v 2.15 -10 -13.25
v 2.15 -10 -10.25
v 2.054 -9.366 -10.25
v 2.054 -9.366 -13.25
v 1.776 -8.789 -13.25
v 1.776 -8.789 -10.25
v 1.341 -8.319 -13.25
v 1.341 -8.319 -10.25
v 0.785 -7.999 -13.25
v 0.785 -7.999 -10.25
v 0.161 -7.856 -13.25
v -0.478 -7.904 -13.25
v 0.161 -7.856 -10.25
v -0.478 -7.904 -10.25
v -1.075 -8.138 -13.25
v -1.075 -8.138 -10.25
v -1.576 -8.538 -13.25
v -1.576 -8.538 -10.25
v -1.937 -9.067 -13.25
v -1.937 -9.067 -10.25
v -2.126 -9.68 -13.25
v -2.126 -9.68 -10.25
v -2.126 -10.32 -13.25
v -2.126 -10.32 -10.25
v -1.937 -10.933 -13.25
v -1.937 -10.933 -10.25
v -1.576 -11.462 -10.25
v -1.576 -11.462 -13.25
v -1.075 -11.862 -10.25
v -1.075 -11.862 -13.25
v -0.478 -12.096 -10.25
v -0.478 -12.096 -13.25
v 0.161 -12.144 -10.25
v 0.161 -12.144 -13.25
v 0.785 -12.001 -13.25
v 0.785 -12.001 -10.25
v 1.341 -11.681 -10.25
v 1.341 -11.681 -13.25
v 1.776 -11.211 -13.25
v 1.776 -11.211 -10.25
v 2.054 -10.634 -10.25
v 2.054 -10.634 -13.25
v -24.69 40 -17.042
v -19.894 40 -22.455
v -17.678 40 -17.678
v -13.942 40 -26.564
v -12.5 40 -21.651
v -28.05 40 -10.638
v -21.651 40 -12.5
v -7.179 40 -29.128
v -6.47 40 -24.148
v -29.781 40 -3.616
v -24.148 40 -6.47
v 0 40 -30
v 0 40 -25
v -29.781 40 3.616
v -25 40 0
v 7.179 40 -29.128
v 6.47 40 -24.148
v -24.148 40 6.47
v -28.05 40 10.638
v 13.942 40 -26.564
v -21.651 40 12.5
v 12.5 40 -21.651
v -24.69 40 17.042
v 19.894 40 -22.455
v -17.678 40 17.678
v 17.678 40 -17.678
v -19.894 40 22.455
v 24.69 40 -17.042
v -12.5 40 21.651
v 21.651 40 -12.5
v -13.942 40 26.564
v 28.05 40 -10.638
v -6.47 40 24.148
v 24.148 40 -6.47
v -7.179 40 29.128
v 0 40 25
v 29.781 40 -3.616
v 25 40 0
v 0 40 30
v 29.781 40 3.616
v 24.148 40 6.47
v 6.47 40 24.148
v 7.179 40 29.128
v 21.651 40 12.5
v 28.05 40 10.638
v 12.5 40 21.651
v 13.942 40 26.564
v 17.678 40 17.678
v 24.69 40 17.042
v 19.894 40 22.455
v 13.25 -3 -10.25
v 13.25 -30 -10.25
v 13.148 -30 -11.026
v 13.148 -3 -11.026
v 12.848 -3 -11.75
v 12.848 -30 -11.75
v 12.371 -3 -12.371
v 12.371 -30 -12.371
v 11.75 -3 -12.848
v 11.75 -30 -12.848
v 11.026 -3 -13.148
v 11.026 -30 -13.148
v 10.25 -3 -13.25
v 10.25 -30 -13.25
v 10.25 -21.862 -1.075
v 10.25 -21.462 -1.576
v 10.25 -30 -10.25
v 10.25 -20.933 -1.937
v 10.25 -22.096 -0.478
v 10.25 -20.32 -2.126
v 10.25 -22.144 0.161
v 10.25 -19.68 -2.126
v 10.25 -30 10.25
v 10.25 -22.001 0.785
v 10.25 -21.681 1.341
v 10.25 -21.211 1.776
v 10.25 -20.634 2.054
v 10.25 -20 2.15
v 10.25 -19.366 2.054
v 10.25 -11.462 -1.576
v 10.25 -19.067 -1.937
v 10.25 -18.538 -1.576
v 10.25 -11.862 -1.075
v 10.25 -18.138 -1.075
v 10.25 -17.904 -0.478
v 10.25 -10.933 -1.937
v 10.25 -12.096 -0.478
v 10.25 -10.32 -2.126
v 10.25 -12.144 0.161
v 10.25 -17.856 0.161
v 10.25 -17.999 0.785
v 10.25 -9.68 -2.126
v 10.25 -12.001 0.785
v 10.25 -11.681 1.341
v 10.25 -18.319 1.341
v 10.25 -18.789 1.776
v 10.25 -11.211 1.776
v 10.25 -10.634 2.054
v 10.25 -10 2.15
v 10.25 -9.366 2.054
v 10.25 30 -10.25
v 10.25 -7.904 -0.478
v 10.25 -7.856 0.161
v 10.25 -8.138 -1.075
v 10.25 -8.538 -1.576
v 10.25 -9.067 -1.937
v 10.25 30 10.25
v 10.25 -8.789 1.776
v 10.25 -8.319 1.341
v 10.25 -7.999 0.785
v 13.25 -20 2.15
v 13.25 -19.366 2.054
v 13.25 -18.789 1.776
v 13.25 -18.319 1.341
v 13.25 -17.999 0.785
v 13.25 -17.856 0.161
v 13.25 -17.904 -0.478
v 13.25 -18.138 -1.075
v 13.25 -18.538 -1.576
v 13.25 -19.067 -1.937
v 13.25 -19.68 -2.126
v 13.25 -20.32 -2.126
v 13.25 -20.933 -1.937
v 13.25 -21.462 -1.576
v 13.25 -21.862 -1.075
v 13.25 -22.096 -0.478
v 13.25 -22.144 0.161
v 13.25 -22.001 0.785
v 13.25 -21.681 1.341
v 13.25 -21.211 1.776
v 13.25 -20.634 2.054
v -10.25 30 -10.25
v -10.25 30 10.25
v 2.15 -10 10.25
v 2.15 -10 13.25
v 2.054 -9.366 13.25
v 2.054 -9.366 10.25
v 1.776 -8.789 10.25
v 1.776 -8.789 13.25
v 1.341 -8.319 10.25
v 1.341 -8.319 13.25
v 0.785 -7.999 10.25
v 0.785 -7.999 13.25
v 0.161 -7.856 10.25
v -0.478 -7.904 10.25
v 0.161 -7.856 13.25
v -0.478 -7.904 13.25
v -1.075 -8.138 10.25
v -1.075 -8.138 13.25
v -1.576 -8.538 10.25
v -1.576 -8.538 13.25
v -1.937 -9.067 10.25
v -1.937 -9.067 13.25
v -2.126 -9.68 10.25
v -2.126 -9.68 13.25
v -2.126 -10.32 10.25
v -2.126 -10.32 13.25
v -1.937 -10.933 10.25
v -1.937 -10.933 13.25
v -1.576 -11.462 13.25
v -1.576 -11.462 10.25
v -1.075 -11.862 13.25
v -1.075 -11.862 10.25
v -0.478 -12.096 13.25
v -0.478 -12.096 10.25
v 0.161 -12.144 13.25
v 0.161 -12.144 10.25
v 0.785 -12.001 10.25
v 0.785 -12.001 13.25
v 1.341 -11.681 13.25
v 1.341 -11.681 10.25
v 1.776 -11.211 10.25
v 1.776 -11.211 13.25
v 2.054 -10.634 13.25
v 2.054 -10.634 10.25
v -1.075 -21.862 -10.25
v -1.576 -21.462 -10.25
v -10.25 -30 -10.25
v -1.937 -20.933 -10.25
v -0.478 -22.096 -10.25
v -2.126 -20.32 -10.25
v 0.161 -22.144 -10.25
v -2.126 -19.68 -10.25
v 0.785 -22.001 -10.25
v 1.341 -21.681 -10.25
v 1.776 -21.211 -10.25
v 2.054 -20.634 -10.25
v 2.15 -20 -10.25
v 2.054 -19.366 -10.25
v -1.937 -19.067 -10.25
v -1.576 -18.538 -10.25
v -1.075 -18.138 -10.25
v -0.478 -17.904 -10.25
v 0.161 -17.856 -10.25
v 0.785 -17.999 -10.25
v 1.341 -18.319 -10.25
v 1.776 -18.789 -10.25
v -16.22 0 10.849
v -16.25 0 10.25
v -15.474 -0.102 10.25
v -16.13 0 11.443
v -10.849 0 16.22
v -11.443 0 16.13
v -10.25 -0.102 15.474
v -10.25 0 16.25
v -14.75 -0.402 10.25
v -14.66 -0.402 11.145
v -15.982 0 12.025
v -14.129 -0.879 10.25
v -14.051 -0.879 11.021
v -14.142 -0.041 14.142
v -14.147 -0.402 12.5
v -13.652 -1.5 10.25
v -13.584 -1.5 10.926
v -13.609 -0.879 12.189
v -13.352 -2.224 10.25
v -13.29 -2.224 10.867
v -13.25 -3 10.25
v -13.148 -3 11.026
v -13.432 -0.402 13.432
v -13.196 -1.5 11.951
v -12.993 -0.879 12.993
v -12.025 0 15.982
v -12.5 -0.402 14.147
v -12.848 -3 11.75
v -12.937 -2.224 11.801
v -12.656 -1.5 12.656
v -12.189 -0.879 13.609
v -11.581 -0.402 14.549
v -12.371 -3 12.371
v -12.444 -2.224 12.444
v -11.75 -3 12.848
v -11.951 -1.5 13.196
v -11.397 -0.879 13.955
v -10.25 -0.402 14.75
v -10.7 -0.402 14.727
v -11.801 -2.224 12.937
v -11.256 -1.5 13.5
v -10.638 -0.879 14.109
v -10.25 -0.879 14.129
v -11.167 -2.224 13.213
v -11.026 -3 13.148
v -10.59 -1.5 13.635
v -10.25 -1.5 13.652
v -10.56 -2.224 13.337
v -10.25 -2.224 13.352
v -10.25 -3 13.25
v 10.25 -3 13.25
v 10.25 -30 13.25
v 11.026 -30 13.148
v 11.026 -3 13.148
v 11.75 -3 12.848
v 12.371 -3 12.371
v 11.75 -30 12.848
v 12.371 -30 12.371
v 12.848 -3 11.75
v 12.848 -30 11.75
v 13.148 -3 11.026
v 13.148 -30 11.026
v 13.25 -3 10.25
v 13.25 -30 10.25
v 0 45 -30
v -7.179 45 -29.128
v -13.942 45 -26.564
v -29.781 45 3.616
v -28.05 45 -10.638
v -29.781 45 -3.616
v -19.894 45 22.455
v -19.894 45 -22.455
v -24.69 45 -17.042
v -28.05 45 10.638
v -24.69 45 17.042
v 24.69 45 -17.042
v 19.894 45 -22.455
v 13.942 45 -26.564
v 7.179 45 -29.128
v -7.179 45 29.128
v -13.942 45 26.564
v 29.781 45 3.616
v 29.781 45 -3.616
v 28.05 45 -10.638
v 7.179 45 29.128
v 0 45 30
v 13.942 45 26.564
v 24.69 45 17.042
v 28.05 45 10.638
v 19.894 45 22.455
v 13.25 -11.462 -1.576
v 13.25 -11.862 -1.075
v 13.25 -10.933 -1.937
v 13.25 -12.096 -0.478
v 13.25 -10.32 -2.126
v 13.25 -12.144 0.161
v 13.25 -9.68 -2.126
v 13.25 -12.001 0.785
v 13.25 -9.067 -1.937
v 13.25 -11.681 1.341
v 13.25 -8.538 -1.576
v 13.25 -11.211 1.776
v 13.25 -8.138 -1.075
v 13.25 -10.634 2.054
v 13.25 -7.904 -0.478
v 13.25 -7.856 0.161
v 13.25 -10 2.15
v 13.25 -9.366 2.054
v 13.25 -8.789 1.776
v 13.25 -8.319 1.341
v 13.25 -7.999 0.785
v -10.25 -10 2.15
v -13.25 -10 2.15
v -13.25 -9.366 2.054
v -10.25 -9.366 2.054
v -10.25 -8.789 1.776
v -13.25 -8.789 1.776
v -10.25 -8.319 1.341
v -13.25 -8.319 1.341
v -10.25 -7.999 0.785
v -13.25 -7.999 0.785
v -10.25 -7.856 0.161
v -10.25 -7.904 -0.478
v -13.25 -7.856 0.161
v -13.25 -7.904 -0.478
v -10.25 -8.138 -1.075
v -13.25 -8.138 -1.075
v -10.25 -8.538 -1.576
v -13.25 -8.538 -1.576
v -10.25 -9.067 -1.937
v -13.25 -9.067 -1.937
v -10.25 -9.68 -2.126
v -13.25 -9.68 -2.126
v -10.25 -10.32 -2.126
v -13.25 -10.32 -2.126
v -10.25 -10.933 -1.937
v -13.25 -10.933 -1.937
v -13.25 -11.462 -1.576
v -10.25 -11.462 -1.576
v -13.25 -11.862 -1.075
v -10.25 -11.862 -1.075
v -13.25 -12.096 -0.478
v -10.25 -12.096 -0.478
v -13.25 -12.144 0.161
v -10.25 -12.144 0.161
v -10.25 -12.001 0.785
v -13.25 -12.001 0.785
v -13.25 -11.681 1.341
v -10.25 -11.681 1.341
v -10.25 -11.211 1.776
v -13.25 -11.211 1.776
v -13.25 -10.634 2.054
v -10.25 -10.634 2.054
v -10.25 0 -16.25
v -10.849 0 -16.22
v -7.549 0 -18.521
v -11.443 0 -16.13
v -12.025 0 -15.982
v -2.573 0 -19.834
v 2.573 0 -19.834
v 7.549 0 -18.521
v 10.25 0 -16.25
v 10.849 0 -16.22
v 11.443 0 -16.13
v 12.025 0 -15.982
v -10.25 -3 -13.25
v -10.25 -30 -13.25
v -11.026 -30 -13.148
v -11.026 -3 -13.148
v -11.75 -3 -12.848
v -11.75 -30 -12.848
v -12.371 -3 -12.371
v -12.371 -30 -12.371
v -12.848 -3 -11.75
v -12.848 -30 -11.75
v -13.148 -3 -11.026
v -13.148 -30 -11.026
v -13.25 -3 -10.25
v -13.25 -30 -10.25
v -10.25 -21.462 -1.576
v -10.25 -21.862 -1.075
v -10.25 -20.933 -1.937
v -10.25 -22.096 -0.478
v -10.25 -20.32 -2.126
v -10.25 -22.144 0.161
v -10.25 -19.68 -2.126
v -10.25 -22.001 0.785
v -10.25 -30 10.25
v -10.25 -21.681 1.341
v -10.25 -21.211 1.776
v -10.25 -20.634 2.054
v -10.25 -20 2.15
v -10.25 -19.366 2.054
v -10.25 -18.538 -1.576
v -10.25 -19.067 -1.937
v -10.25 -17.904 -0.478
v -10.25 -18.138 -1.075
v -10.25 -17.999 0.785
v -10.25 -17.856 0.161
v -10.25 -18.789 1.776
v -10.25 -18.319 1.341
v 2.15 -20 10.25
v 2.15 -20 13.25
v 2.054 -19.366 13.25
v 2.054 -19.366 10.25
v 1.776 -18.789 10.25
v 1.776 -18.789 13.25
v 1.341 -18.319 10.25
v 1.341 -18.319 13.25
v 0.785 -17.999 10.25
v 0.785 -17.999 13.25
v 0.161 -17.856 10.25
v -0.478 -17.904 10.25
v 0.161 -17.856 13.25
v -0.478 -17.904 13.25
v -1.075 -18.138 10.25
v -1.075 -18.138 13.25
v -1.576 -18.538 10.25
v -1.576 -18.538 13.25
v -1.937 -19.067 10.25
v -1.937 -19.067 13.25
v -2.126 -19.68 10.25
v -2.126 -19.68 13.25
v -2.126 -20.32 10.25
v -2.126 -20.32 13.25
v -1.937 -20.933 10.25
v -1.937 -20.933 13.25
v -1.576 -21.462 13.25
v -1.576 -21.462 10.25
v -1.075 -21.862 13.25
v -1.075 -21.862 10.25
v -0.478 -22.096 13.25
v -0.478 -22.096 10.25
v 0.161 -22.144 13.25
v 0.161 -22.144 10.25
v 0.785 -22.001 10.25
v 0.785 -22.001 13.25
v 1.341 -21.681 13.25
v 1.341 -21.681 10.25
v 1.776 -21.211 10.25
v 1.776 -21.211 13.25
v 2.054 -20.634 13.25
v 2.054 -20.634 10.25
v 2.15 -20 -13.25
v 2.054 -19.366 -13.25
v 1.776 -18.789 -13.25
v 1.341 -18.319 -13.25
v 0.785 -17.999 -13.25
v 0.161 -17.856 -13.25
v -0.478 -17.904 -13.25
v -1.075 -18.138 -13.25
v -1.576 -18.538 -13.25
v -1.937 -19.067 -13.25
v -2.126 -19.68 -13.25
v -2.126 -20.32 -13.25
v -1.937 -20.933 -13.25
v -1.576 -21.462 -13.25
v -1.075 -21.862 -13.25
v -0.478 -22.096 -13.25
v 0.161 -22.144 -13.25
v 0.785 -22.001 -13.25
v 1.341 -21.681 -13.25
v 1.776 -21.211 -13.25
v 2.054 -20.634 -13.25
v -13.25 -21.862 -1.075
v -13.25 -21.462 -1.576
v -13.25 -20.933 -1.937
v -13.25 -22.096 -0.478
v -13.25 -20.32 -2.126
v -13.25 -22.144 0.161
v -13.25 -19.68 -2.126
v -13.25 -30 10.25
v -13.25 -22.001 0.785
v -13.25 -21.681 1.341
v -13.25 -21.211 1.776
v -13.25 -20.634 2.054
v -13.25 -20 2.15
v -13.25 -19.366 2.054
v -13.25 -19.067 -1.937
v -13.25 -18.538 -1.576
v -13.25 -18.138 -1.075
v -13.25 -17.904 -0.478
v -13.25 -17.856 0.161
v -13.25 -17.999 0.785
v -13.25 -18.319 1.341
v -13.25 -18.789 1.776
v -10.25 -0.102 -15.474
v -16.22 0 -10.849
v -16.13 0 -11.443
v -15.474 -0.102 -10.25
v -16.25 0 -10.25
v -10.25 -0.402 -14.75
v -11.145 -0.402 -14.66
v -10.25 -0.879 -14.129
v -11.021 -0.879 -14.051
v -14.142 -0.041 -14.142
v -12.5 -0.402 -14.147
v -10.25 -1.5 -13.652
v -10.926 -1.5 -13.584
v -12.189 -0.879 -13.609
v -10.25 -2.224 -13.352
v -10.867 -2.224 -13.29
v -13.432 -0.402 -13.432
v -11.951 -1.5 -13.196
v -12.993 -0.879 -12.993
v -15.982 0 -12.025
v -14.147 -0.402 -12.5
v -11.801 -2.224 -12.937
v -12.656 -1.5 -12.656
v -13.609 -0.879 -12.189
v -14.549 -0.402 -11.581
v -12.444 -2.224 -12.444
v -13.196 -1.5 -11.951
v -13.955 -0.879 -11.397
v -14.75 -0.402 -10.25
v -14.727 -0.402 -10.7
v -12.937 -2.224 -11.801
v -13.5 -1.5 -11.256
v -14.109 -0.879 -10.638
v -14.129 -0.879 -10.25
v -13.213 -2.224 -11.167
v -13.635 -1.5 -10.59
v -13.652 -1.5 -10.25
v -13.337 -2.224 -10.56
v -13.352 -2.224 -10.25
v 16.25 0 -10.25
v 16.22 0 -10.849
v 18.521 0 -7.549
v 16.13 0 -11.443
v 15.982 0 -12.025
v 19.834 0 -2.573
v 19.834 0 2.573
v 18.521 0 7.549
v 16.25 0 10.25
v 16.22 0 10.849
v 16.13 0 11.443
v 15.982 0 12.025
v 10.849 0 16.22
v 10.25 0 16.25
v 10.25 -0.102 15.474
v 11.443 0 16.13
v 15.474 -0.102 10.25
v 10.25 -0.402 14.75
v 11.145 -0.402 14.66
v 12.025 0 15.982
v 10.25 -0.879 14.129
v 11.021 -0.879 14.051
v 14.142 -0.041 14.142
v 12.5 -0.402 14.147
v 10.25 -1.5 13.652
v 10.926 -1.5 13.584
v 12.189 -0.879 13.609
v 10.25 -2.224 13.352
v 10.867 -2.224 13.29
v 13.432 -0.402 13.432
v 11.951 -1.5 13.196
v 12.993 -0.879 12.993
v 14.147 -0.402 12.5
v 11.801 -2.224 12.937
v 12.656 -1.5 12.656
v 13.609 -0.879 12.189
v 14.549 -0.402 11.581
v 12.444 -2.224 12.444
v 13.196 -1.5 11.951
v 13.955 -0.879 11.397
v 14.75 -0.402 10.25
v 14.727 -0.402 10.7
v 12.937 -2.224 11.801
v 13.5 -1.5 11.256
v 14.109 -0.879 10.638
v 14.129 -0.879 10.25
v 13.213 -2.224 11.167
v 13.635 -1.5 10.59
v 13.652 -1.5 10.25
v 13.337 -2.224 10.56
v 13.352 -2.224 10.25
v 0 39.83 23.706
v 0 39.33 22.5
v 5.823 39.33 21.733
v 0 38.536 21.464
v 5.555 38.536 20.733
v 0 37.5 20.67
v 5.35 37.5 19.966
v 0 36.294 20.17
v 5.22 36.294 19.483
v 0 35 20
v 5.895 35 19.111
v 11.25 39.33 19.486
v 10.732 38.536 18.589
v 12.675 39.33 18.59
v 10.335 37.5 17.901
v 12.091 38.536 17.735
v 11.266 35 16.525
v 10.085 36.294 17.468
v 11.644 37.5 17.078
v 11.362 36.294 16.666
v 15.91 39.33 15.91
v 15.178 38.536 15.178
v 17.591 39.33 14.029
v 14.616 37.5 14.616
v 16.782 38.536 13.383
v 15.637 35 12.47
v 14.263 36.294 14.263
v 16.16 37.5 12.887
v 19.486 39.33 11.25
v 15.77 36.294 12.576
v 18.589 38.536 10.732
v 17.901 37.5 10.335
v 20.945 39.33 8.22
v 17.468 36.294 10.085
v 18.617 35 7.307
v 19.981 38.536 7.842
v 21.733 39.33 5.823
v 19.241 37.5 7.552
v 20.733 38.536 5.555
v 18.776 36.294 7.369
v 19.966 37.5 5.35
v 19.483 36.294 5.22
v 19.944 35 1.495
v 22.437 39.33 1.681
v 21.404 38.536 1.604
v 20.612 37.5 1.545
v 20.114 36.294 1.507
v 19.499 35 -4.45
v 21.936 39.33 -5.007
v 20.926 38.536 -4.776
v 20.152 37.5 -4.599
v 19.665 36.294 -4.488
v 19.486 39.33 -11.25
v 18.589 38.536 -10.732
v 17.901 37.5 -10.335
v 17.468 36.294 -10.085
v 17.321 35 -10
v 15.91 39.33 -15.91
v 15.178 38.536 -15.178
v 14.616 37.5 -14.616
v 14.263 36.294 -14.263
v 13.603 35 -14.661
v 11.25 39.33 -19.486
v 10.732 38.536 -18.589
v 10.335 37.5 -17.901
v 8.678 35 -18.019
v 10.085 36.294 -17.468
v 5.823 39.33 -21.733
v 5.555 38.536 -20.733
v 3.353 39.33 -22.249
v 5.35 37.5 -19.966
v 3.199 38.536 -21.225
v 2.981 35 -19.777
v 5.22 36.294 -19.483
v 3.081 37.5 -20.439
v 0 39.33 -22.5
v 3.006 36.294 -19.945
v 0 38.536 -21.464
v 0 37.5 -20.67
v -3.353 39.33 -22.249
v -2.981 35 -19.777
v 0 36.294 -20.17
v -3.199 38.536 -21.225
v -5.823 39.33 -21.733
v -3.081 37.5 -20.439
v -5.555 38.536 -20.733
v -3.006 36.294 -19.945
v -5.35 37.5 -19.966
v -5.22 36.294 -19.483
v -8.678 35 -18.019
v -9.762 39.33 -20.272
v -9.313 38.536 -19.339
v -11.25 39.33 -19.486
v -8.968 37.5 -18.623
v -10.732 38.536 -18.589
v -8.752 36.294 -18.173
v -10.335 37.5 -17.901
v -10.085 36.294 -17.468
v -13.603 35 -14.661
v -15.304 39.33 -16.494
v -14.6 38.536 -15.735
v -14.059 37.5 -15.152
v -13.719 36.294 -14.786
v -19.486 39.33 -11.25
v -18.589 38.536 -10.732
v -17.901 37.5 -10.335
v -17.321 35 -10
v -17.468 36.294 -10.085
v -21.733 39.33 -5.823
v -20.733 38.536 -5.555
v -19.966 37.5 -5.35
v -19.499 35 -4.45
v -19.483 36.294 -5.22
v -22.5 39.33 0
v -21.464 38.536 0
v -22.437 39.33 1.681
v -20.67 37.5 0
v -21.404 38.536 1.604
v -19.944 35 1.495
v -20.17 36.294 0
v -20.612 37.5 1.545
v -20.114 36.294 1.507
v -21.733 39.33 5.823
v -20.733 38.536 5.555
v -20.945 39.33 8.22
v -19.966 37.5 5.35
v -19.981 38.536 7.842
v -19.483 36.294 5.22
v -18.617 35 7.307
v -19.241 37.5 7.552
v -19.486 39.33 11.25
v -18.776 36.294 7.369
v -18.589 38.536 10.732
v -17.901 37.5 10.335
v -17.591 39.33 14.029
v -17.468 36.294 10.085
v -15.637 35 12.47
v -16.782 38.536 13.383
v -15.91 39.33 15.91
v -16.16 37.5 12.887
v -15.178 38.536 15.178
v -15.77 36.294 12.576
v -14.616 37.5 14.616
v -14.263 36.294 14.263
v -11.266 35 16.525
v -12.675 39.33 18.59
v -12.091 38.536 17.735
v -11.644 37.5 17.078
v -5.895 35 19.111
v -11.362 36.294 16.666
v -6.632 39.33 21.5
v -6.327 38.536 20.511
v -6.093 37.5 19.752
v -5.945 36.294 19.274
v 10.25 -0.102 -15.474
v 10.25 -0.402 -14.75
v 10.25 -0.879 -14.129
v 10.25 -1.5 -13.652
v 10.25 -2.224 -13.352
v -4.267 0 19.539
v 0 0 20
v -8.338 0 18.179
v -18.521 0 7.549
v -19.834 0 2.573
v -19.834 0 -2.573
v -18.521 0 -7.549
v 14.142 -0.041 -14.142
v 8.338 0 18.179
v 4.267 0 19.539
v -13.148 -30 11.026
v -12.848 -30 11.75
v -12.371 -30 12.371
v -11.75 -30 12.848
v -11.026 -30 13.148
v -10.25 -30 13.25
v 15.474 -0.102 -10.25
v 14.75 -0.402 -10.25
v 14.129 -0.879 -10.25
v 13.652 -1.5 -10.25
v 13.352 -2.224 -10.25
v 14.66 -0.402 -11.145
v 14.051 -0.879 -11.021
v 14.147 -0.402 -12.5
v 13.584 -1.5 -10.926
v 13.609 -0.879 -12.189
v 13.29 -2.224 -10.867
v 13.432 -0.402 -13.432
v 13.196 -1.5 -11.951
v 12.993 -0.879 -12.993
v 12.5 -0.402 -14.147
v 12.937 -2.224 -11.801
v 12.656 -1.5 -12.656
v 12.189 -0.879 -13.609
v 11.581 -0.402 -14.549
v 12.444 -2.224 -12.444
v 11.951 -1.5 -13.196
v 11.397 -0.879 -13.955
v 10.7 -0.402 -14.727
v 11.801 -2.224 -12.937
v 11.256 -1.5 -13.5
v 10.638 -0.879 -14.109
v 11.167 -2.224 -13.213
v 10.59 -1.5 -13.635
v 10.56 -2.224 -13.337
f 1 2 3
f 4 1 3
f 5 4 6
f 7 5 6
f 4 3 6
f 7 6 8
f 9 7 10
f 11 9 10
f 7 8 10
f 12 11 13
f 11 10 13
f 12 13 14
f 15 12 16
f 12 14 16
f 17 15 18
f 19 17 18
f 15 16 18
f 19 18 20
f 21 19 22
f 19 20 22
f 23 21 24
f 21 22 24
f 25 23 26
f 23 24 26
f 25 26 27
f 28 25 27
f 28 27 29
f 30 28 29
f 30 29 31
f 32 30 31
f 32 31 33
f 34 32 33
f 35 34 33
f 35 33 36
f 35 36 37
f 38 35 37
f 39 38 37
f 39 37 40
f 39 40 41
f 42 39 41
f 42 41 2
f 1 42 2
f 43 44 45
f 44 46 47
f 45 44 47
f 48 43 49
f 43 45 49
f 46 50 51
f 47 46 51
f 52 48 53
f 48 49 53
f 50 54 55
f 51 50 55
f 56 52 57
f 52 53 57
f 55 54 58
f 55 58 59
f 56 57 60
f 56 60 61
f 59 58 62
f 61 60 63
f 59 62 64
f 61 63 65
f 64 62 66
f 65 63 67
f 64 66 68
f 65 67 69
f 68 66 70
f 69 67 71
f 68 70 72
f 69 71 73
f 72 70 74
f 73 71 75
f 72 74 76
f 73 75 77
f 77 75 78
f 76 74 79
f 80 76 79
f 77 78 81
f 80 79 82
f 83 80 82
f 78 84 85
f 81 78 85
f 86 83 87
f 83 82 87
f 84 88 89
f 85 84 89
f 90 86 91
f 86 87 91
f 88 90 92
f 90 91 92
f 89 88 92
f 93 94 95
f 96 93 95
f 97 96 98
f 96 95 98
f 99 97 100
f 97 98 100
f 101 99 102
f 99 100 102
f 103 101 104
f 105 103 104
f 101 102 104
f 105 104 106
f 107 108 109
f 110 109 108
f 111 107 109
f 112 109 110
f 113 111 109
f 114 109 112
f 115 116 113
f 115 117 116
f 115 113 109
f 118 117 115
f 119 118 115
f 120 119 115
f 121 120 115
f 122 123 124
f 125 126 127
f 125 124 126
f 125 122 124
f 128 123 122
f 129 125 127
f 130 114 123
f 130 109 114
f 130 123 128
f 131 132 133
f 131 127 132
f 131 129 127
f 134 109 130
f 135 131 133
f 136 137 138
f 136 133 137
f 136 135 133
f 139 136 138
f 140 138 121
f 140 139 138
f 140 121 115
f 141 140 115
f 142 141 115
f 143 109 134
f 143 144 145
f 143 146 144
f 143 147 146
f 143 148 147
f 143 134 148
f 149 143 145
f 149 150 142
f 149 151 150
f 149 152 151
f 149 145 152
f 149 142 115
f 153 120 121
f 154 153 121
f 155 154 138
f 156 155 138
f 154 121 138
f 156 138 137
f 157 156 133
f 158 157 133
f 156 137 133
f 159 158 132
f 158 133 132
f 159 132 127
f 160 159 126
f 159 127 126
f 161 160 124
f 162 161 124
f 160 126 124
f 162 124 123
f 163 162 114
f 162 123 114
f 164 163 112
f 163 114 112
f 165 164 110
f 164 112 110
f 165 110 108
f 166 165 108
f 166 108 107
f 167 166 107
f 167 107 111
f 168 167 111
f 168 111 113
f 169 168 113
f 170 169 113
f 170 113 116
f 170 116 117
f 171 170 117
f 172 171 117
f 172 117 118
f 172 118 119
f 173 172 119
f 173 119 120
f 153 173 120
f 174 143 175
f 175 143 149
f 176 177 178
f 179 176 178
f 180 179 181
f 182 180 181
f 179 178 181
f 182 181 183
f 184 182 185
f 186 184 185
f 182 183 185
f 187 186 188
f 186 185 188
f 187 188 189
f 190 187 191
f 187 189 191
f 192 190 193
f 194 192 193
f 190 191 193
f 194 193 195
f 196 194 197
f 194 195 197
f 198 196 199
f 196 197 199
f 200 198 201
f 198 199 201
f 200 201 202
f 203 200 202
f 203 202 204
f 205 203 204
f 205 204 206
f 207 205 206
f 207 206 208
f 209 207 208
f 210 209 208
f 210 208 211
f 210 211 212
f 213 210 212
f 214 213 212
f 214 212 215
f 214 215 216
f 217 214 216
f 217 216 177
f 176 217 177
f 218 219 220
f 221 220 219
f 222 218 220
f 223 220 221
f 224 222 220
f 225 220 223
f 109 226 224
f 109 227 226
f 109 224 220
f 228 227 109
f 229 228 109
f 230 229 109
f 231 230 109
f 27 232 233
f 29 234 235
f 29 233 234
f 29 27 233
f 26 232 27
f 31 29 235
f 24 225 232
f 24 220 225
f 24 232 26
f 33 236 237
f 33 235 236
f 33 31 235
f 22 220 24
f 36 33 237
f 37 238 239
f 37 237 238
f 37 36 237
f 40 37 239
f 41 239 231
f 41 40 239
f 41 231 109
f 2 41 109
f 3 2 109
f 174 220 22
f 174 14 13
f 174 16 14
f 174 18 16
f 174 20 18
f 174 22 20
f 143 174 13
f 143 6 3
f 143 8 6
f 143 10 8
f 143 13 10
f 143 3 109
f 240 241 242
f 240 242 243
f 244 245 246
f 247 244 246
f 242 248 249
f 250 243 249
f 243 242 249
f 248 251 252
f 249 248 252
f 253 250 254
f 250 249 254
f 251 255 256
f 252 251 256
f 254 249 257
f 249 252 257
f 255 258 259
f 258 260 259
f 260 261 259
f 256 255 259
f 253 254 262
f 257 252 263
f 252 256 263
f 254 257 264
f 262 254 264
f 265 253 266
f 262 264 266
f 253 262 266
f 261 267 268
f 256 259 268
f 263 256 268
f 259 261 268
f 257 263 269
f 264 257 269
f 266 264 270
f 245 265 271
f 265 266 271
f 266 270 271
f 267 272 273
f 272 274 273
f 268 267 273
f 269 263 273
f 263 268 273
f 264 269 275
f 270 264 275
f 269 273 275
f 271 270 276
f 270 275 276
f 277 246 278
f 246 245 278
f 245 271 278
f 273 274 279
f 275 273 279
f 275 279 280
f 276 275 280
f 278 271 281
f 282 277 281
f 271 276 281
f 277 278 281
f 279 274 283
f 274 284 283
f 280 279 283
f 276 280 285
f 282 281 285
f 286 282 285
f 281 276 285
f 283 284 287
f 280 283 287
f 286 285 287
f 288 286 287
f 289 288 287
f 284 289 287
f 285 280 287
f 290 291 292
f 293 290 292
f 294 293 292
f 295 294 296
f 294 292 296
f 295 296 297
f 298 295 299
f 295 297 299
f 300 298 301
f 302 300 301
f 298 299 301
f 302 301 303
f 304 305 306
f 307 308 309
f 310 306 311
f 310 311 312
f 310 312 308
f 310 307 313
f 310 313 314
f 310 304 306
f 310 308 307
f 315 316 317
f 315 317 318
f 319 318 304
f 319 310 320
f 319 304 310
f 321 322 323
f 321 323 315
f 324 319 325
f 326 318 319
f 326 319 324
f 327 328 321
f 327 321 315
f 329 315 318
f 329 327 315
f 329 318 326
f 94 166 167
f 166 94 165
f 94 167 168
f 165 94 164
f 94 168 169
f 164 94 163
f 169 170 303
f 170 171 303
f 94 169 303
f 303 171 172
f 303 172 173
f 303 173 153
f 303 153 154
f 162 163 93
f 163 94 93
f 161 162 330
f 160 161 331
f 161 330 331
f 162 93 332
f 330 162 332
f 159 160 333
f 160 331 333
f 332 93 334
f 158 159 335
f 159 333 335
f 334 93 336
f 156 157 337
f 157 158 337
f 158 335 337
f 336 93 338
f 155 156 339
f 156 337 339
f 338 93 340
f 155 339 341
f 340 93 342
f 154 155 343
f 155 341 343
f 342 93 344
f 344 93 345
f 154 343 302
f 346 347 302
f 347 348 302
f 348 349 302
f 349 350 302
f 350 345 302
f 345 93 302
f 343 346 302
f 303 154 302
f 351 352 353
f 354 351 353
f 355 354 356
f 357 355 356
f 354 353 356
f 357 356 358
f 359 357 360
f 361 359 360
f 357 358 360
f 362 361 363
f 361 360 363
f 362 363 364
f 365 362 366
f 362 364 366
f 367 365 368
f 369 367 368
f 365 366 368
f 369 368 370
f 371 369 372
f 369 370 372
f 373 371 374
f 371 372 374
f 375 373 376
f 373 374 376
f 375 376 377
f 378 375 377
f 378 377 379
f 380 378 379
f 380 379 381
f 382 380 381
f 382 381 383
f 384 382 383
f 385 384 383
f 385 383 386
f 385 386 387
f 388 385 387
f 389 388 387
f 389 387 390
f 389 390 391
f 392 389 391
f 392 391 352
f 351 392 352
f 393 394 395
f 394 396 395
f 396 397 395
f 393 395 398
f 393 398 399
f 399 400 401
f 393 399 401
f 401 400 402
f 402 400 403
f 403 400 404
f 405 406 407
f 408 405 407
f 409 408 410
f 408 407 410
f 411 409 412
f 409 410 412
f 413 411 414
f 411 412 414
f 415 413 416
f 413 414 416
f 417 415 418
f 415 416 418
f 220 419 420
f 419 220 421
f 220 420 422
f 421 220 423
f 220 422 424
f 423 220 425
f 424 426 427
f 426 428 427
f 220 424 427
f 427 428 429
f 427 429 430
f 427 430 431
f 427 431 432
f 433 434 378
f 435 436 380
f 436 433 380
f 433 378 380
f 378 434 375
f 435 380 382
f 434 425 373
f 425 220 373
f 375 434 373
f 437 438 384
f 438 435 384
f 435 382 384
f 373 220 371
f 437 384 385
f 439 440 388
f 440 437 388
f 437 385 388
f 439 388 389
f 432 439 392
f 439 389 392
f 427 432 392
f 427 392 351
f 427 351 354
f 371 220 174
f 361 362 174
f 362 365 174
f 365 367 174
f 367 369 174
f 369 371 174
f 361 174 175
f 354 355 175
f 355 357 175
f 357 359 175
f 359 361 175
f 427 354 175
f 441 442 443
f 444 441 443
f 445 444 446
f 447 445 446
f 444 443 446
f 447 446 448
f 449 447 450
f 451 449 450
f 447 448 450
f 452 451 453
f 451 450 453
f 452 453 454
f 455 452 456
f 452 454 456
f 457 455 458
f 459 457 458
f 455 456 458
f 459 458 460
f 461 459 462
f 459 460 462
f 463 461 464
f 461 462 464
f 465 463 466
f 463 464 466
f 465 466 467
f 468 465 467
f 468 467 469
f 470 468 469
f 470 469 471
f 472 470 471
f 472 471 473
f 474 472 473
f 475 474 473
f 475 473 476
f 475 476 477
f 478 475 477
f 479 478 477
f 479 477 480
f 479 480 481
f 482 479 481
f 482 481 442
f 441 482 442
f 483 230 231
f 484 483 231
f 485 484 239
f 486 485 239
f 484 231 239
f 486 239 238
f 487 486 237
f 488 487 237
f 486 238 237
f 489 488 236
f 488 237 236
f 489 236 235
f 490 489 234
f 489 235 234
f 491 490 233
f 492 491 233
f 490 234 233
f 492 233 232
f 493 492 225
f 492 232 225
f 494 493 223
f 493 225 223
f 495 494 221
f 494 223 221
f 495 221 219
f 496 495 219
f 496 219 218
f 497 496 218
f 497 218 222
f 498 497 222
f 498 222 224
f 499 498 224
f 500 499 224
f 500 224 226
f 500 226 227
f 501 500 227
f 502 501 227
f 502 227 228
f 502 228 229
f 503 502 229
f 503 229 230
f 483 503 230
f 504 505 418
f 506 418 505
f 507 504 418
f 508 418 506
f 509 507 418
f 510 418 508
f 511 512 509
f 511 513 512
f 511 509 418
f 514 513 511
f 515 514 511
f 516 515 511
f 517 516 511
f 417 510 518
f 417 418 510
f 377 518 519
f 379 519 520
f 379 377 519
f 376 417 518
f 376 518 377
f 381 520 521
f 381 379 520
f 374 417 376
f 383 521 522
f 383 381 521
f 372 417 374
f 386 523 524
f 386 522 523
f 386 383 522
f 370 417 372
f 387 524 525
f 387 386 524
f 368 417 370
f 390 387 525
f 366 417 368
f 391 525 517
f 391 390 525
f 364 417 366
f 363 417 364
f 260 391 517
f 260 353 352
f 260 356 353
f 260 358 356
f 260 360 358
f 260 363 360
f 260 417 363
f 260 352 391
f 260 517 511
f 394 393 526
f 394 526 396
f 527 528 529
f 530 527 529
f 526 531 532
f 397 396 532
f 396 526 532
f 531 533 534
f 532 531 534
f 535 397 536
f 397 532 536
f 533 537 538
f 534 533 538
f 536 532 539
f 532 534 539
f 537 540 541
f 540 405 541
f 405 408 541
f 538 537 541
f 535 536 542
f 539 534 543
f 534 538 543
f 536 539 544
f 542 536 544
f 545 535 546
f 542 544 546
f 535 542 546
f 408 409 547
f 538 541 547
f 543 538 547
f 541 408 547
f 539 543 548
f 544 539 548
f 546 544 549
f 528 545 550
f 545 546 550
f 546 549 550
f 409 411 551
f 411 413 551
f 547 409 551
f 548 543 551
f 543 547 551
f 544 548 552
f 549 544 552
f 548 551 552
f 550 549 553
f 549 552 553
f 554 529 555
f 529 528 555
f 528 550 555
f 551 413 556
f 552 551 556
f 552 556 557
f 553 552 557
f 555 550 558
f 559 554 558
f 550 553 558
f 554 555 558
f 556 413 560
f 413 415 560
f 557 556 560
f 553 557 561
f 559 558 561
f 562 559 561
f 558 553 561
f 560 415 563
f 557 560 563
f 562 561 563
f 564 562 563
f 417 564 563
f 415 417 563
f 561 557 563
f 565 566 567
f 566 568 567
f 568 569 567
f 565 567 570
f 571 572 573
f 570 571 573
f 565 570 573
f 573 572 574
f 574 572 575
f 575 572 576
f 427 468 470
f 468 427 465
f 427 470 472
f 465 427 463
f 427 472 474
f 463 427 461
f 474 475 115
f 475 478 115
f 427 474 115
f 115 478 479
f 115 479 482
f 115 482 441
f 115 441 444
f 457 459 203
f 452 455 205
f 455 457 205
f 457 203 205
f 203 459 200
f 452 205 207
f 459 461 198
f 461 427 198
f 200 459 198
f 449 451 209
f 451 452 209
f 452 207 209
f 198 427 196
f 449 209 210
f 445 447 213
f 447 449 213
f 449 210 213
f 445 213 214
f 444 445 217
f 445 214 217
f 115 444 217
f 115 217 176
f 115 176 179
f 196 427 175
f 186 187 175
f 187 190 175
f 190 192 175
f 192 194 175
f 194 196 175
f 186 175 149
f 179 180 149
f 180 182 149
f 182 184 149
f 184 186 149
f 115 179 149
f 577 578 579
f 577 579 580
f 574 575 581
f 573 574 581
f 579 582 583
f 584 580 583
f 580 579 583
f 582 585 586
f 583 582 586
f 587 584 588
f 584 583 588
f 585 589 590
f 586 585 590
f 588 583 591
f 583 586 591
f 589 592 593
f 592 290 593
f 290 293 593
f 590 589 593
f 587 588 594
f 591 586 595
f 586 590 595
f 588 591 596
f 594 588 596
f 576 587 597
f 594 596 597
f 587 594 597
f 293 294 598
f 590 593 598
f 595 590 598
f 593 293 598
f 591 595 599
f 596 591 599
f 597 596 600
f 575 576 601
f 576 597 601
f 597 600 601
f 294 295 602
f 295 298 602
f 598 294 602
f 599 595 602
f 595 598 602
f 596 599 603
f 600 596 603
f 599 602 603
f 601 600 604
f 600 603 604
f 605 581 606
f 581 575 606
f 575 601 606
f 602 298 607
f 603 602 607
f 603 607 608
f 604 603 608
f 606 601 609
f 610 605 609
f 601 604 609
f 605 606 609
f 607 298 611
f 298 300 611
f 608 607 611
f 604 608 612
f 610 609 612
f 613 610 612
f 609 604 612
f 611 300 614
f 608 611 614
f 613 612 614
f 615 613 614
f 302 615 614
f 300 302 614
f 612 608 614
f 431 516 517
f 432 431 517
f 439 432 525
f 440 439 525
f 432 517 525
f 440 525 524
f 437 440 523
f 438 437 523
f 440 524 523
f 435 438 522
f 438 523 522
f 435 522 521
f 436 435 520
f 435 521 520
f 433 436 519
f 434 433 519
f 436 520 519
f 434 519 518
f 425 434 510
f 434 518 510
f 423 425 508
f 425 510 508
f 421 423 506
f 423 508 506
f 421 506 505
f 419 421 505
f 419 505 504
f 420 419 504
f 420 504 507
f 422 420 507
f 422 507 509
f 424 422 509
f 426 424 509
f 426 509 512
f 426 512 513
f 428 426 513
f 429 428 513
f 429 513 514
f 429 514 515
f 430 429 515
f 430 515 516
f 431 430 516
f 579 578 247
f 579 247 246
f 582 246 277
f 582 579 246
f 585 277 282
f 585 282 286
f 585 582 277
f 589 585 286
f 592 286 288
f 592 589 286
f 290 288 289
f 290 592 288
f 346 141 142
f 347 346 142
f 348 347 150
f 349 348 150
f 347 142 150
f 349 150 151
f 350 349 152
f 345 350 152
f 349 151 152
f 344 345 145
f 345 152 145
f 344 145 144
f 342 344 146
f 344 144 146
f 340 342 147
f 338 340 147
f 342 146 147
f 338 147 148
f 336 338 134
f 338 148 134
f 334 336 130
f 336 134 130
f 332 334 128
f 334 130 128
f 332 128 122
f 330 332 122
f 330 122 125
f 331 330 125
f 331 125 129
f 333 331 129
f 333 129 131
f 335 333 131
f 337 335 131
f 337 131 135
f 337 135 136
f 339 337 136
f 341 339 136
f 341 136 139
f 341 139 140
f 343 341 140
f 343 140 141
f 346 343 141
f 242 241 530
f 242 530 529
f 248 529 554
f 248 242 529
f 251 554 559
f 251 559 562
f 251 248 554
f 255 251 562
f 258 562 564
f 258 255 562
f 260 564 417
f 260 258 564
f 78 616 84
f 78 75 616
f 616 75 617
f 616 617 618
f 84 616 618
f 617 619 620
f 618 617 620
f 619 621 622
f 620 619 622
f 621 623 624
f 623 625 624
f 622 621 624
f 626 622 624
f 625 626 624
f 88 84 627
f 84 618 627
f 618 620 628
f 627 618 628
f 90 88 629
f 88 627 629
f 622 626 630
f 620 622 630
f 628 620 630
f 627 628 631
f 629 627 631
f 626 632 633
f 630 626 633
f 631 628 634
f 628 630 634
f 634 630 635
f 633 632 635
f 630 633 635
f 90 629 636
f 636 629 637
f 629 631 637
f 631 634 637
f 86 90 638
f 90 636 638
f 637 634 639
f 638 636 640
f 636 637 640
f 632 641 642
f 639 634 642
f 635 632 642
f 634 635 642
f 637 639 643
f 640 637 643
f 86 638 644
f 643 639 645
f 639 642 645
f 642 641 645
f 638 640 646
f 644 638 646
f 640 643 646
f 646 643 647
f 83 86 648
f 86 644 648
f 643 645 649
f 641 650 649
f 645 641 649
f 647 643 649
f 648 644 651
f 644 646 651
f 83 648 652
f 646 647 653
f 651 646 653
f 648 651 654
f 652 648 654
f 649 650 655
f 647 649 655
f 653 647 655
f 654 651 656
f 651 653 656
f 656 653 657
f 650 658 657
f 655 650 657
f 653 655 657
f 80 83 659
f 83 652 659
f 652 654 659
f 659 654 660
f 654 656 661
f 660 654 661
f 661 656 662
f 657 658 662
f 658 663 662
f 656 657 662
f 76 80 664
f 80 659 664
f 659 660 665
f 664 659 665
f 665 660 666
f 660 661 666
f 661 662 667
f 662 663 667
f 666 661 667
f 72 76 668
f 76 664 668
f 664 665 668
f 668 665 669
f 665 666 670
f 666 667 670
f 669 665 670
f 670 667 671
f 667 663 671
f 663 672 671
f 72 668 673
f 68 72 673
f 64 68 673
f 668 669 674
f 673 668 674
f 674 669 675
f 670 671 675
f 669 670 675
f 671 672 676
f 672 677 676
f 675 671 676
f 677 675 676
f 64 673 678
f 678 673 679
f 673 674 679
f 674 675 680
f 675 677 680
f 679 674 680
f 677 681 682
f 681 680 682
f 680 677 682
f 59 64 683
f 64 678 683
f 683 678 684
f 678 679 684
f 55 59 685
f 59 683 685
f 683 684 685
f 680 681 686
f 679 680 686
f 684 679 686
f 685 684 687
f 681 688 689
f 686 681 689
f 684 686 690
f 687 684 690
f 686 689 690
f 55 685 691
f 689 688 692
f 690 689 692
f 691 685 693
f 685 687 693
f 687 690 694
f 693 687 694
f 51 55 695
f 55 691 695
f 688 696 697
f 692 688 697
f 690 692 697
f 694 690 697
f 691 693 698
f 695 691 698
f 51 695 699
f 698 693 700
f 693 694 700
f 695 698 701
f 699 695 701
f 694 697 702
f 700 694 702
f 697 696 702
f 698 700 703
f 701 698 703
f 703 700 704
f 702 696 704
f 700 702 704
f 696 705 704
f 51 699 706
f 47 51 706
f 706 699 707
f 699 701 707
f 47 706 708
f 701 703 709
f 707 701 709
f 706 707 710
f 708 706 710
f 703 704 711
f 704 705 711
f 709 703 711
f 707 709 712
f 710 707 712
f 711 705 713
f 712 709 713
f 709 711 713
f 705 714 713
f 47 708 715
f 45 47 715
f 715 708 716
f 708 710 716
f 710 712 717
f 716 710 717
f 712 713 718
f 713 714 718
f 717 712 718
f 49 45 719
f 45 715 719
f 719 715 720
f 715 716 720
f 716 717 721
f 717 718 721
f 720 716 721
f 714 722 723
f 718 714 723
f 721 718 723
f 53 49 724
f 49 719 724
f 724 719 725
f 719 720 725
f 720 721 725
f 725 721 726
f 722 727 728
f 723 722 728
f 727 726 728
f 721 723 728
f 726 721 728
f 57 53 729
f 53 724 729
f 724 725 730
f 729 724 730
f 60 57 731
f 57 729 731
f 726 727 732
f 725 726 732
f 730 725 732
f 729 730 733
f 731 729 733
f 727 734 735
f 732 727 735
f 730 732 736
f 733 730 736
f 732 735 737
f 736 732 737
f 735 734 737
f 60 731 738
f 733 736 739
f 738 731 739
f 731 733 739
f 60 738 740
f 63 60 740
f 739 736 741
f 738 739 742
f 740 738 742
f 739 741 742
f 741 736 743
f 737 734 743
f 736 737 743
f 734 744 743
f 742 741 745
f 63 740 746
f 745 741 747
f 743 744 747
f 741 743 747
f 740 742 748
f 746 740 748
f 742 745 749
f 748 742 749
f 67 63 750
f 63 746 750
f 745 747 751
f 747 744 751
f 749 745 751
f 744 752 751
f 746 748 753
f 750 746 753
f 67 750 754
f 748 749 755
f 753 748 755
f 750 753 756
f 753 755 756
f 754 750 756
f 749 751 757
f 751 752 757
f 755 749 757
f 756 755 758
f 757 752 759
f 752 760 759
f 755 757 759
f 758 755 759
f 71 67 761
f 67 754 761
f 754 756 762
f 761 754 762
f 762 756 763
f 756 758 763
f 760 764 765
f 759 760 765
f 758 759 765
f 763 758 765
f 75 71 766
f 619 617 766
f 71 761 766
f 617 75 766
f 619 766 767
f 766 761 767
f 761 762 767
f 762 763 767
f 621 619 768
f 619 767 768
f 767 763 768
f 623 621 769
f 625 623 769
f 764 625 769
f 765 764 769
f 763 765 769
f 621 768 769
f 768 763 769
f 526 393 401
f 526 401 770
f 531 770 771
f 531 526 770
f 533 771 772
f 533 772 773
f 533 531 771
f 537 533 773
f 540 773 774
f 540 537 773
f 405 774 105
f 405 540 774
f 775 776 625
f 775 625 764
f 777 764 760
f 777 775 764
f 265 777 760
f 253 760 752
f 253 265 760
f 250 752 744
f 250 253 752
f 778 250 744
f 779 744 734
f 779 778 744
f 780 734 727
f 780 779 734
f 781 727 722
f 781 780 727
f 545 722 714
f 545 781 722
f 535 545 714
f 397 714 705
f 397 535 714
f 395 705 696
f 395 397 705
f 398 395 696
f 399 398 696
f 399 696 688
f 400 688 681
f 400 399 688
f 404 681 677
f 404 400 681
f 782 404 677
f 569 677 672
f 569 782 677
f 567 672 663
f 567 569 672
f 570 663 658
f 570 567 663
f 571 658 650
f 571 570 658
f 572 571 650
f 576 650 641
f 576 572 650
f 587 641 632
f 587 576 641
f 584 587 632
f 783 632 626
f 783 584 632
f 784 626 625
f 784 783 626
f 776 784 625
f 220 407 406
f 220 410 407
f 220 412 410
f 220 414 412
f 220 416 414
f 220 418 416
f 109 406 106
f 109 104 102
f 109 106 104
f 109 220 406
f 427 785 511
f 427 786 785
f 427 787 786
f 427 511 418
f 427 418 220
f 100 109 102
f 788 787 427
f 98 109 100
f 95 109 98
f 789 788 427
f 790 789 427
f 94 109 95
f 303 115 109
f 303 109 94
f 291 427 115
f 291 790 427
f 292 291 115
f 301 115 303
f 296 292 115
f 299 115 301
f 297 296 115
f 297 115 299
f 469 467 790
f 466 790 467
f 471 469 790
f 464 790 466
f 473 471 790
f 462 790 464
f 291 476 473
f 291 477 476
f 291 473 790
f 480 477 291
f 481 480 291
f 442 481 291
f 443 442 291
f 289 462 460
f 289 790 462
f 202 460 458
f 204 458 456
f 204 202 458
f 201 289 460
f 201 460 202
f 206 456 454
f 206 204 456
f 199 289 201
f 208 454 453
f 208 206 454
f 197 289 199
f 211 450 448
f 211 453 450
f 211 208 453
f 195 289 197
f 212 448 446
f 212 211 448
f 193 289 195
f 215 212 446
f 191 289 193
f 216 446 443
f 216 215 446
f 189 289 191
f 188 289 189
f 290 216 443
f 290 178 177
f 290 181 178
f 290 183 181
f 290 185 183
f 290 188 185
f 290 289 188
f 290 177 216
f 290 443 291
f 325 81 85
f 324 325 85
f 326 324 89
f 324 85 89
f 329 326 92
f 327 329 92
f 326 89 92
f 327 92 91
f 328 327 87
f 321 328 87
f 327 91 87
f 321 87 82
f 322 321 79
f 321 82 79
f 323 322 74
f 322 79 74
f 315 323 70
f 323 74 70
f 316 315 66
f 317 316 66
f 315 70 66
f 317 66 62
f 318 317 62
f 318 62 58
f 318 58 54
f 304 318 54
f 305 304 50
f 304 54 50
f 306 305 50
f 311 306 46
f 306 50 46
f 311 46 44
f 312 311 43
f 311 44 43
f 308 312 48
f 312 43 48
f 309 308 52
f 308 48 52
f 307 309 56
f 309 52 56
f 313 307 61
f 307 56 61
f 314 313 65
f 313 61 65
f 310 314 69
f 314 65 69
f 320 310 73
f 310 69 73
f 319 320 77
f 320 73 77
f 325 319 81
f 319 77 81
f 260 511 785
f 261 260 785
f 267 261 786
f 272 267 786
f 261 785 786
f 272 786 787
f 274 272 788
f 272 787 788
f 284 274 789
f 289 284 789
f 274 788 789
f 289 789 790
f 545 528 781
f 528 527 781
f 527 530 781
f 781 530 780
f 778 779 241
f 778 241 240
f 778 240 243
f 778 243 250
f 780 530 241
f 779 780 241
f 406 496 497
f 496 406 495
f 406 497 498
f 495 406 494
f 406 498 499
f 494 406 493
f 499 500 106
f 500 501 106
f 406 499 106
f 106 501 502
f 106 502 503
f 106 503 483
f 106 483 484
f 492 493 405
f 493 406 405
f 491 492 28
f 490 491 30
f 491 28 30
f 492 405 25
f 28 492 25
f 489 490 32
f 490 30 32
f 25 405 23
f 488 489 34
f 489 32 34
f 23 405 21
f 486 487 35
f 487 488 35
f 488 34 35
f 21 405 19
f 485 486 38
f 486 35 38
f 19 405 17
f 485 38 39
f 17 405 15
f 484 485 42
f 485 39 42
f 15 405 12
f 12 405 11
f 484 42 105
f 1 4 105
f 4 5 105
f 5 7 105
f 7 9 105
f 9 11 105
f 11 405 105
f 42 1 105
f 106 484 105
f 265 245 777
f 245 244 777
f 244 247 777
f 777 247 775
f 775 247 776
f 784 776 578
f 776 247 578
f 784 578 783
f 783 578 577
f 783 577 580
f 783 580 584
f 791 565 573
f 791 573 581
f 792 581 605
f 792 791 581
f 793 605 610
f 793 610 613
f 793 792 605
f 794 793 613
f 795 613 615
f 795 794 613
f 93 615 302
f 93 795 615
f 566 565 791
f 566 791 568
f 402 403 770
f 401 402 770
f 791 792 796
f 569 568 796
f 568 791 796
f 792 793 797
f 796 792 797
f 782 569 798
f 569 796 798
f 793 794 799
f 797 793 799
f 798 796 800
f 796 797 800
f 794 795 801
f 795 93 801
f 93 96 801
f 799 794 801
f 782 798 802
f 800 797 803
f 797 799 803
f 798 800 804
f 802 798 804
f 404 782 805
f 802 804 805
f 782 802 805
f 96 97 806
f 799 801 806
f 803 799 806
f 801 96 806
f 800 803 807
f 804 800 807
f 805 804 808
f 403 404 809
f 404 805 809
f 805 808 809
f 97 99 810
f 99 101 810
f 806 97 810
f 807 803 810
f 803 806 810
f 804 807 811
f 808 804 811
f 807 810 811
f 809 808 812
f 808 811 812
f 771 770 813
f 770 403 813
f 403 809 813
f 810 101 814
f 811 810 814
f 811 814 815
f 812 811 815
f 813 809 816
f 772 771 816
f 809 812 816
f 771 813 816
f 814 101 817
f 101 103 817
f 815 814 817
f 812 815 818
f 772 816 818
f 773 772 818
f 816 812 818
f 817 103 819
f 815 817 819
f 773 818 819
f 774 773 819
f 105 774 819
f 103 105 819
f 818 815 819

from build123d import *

# Parameters (mm, degrees)
SKETCH_1_R          = 20
SKETCH_1_W          = 20.5
SKETCH_1_H          = 20.5
EXTRUDE_1_DEPTH     = 30
SKETCH_5_R          = 20
EXTRUDE_3_DEPTH     = 10
SKETCH_3_W          = 26.5
SKETCH_3_H          = 26.5
SKETCH_3_W_2        = 20.5
SKETCH_3_H_2        = 20.5
EXTRUDE_4_DEPTH     = 30
SKETCH_6_R          = 2.15
CUT_EXTRUDE_1_DEPTH = 30
SKETCH_7_R          = 2.15
CUT_EXTRUDE_2_DEPTH = 30
FILLET_1_R          = 3
FILLET_2_R          = 3
FILLET_3_R          = 3
FILLET_4_R          = 3
FILLET_5_R          = 3
SKETCH_11_R         = 30
EXTRUDE_5_DEPTH     = 5
FILLET_6_R          = 5


with BuildPart() as part:
    # 草图1 → 凸台-拉伸1 (new body)
    with BuildSketch(Plane(origin=(0, 0, 0), x_dir=(1, 0, 0), z_dir=(0, 1, 0))):
        with Locations(Location((0, 0, 0), (0, 0, 270))):
            Circle(SKETCH_1_R)
        Rectangle(SKETCH_1_W, SKETCH_1_H, mode=Mode.SUBTRACT)
    extrude(amount=EXTRUDE_1_DEPTH)

    # 草图5 → 凸台-拉伸3 (add)
    with BuildSketch(Plane(origin=(0, 30, 0), x_dir=(1, 0, 0), z_dir=(0, 1, 0))):
        with Locations(Location((0, 0, 0), (0, 0, 270))):
            Circle(SKETCH_5_R)
    extrude(amount=EXTRUDE_3_DEPTH)

    # 草图3 → 凸台-拉伸4 (add)
    with BuildSketch(Plane.XZ):
        Rectangle(SKETCH_3_W, SKETCH_3_H)
        Rectangle(SKETCH_3_W_2, SKETCH_3_H_2, mode=Mode.SUBTRACT)
    extrude(amount=EXTRUDE_4_DEPTH)

    # 草图6 → 切除-拉伸1 (cut)
    with BuildSketch(Plane.XY.offset(13.25)):
        with Locations((0, -10)):
            Circle(SKETCH_6_R)
        with Locations((0, -20)):
            Circle(SKETCH_6_R)
    extrude(amount=-CUT_EXTRUDE_1_DEPTH, mode=Mode.SUBTRACT)

    # 草图7 → 切除-拉伸2 (cut)
    with BuildSketch(Plane.ZY.offset(13.25)):
        with Locations((0, -10)):
            Circle(SKETCH_7_R)
        with Locations((0, -20)):
            Circle(SKETCH_7_R)
    extrude(amount=-CUT_EXTRUDE_2_DEPTH, mode=Mode.SUBTRACT)

    # 圆角1
    fillet_1_edges = [part.edges().sort_by_distance(p)[0] for p in [
        (-13.25, -15, 13.25),
    ]]
    fillet(fillet_1_edges, radius=FILLET_1_R)

    # 圆角2
    fillet_2_edges = [part.edges().sort_by_distance(p)[0] for p in [
        (13.25, -15, 13.25),
    ]]
    fillet(fillet_2_edges, radius=FILLET_2_R)

    # 圆角3
    fillet_3_edges = [part.edges().sort_by_distance(p)[0] for p in [
        (13.25, -15, -13.25),
    ]]
    fillet(fillet_3_edges, radius=FILLET_3_R)

    # 圆角4
    fillet_4_edges = [part.edges().sort_by_distance(p)[0] for p in [
        (-13.25, -15, -13.25),
    ]]
    fillet(fillet_4_edges, radius=FILLET_4_R)

    # 圆角5
    # the kernel refuses this fillet: 3 mm, written as the material it adds along each edge
    with BuildSketch(Plane(origin=(10.25, 0, 13.25), x_dir=(0, 0, 1), z_dir=(-1, 0, 0)), Plane(origin=(13.25, 0, -10.25), x_dir=(1, 0, 0), z_dir=(0, 0, 1)), Plane(origin=(-10.25, 0, -13.25), x_dir=(0, 0, -1), z_dir=(1, 0, 0)), Plane(origin=(-13.25, 0, 10.25), x_dir=(-1, 0, 0), z_dir=(0, 0, -1))) as fillet_5_piece_1:
        with BuildLine():
            CenterArc((FILLET_5_R, -FILLET_5_R), FILLET_5_R, 90, 90)
            Line((0, -FILLET_5_R), (0, 0))
            Line((0, 0), (FILLET_5_R, 0))
        make_face()
    extrude(amount=20.5)
    with BuildSketch(Plane(origin=(10.25, 0, 10.25), x_dir=(0, 0, 1), z_dir=(-1, 0, 0))) as fillet_5_piece_2_section:
        with BuildLine():
            CenterArc((3 + FILLET_5_R, -FILLET_5_R), FILLET_5_R, 90, 90)
            Line((3, -FILLET_5_R), (3, 0))
            Line((3, 0), (3 + FILLET_5_R, 0))
        make_face()
    fillet_5_piece_2 = revolve(axis=Axis((10.25, 0, 10.25), (0, 1, 0)), revolution_arc=90, mode=Mode.PRIVATE)
    fillet_5_piece_2 = fillet_5_piece_2 & Plane(origin=(0, -0.618331703, 0), x_dir=(0, 0, 1), z_dir=(0, -1, 0)) * Cylinder(20, 24, mode=Mode.PRIVATE)
    add(fillet_5_piece_2)
    with BuildSketch(Plane(origin=(10.25, 0, -10.25), x_dir=(1, 0, 0), z_dir=(0, 0, 1))) as fillet_5_piece_3_section:
        with BuildLine():
            CenterArc((3 + FILLET_5_R, -FILLET_5_R), FILLET_5_R, 90, 90)
            Line((3, -FILLET_5_R), (3, 0))
            Line((3, 0), (3 + FILLET_5_R, 0))
        make_face()
    fillet_5_piece_3 = revolve(axis=Axis((10.25, 0, -10.25), (0, 1, 0)), revolution_arc=90, mode=Mode.PRIVATE)
    fillet_5_piece_3 = fillet_5_piece_3 & Plane(origin=(0, -0.618331703, 0), x_dir=(0, 0, 1), z_dir=(0, -1, 0)) * Cylinder(20, 24, mode=Mode.PRIVATE)
    add(fillet_5_piece_3)
    with BuildSketch(Plane(origin=(-10.25, 0, -10.25), x_dir=(0, 0, -1), z_dir=(1, 0, 0))) as fillet_5_piece_4_section:
        with BuildLine():
            CenterArc((3 + FILLET_5_R, -FILLET_5_R), FILLET_5_R, 90, 90)
            Line((3, -FILLET_5_R), (3, 0))
            Line((3, 0), (3 + FILLET_5_R, 0))
        make_face()
    fillet_5_piece_4 = revolve(axis=Axis((-10.25, 0, -10.25), (0, 1, 0)), revolution_arc=90, mode=Mode.PRIVATE)
    fillet_5_piece_4 = fillet_5_piece_4 & Plane(origin=(0, -0.618331703, 0), x_dir=(0, 0, 1), z_dir=(0, -1, 0)) * Cylinder(20, 24, mode=Mode.PRIVATE)
    add(fillet_5_piece_4)
    with BuildSketch(Plane(origin=(-10.25, 0, 10.25), x_dir=(-1, 0, 0), z_dir=(0, 0, -1))) as fillet_5_piece_5_section:
        with BuildLine():
            CenterArc((3 + FILLET_5_R, -FILLET_5_R), FILLET_5_R, 90, 90)
            Line((3, -FILLET_5_R), (3, 0))
            Line((3, 0), (3 + FILLET_5_R, 0))
        make_face()
    fillet_5_piece_5 = revolve(axis=Axis((-10.25, 0, 10.25), (0, 1, 0)), revolution_arc=90, mode=Mode.PRIVATE)
    fillet_5_piece_5 = fillet_5_piece_5 & Plane(origin=(0, -0.618331703, 0), x_dir=(0, 0, 1), z_dir=(0, -1, 0)) * Cylinder(20, 24, mode=Mode.PRIVATE)
    add(fillet_5_piece_5)

    # 草图11 → 凸台-拉伸5 (add)
    with BuildSketch(Plane(origin=(0, 40, 0), x_dir=(1, 0, 0), z_dir=(0, 1, 0))):
        with Locations(Location((0, 0, 0), (0, 0, 270))):
            Circle(SKETCH_11_R)
    extrude(amount=EXTRUDE_5_DEPTH)

    # 圆角6
    fillet_6_edges = [part.edges().sort_by_distance(p)[0] for p in [
        (0, 40, -20),
    ]]
    fillet(fillet_6_edges, radius=FILLET_6_R)


solid = part.part
